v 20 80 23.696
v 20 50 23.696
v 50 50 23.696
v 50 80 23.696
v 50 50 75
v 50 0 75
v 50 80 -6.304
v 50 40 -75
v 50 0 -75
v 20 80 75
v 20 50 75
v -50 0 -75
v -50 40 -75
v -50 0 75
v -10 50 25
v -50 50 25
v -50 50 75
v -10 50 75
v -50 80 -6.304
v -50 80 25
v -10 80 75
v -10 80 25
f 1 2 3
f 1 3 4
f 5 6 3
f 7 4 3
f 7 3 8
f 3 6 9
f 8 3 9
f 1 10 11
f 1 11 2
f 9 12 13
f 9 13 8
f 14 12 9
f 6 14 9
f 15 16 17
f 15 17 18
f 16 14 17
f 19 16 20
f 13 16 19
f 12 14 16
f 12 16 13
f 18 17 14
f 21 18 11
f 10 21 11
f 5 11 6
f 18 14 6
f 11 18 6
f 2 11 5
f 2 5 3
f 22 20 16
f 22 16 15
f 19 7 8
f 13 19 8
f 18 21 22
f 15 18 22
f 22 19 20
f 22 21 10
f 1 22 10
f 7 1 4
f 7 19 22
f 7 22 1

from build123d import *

# Parameters (mm, degrees)
SKETCH3_W               = 100
SKETCH3_H               = 150
BOSS_EXTRUDE2_DEPTH     = 80
CUT_EXTRUDE4_DEPTH      = 100
CUT_EXTRUDE5_DEPTH      = 149.408220797
CUT_EXTRUDE5_DEPTH_BACK = 30
SKETCH4_5_W             = 51.304080983
SKETCH4_5_H             = 30
SKETCH6_W               = 40
SKETCH6_H               = 50
CUT_EXTRUDE6_DEPTH      = 30


with BuildPart() as part:
    # Sketch3 → Boss-Extrude2 (new body)
    with BuildSketch(Plane(origin=(0, 0, 0), x_dir=(1, 0, 0), z_dir=(0, 1, 0))):
        Rectangle(SKETCH3_W, SKETCH3_H)
    extrude(amount=BOSS_EXTRUDE2_DEPTH)

    # Sketch4 → Cut-Extrude4 (cut)
    with BuildSketch(Plane(origin=(50, 0, 0), x_dir=(0, 0, -1), z_dir=(1, 0, 0))):
        Polygon((75, 80), (6.304080983, 80), (75, 40), align=None)
    extrude(amount=-CUT_EXTRUDE4_DEPTH, mode=Mode.SUBTRACT)

    # Sketch4<5> → Cut-Extrude5 (cut, two sides: drawn at the far end of the back side and taken through both)
    with BuildSketch(Plane(origin=(50, 0, 0), x_dir=(0, 0, -1), z_dir=(1, 0, 0)).offset(-CUT_EXTRUDE5_DEPTH_BACK)):
        with Locations((-49.347959508, 65)):
            Rectangle(SKETCH4_5_W, SKETCH4_5_H)
    extrude(amount=CUT_EXTRUDE5_DEPTH + CUT_EXTRUDE5_DEPTH_BACK, mode=Mode.SUBTRACT)

    # Sketch6 → Cut-Extrude6 (cut)
    with BuildSketch(Plane(origin=(0, 80, 0), x_dir=(1, 0, 0), z_dir=(0, 1, 0))):
        with Locations((-30, -50)):
            Rectangle(SKETCH6_W, SKETCH6_H)
    extrude(amount=-CUT_EXTRUDE6_DEPTH, mode=Mode.SUBTRACT)


solid = part.part
